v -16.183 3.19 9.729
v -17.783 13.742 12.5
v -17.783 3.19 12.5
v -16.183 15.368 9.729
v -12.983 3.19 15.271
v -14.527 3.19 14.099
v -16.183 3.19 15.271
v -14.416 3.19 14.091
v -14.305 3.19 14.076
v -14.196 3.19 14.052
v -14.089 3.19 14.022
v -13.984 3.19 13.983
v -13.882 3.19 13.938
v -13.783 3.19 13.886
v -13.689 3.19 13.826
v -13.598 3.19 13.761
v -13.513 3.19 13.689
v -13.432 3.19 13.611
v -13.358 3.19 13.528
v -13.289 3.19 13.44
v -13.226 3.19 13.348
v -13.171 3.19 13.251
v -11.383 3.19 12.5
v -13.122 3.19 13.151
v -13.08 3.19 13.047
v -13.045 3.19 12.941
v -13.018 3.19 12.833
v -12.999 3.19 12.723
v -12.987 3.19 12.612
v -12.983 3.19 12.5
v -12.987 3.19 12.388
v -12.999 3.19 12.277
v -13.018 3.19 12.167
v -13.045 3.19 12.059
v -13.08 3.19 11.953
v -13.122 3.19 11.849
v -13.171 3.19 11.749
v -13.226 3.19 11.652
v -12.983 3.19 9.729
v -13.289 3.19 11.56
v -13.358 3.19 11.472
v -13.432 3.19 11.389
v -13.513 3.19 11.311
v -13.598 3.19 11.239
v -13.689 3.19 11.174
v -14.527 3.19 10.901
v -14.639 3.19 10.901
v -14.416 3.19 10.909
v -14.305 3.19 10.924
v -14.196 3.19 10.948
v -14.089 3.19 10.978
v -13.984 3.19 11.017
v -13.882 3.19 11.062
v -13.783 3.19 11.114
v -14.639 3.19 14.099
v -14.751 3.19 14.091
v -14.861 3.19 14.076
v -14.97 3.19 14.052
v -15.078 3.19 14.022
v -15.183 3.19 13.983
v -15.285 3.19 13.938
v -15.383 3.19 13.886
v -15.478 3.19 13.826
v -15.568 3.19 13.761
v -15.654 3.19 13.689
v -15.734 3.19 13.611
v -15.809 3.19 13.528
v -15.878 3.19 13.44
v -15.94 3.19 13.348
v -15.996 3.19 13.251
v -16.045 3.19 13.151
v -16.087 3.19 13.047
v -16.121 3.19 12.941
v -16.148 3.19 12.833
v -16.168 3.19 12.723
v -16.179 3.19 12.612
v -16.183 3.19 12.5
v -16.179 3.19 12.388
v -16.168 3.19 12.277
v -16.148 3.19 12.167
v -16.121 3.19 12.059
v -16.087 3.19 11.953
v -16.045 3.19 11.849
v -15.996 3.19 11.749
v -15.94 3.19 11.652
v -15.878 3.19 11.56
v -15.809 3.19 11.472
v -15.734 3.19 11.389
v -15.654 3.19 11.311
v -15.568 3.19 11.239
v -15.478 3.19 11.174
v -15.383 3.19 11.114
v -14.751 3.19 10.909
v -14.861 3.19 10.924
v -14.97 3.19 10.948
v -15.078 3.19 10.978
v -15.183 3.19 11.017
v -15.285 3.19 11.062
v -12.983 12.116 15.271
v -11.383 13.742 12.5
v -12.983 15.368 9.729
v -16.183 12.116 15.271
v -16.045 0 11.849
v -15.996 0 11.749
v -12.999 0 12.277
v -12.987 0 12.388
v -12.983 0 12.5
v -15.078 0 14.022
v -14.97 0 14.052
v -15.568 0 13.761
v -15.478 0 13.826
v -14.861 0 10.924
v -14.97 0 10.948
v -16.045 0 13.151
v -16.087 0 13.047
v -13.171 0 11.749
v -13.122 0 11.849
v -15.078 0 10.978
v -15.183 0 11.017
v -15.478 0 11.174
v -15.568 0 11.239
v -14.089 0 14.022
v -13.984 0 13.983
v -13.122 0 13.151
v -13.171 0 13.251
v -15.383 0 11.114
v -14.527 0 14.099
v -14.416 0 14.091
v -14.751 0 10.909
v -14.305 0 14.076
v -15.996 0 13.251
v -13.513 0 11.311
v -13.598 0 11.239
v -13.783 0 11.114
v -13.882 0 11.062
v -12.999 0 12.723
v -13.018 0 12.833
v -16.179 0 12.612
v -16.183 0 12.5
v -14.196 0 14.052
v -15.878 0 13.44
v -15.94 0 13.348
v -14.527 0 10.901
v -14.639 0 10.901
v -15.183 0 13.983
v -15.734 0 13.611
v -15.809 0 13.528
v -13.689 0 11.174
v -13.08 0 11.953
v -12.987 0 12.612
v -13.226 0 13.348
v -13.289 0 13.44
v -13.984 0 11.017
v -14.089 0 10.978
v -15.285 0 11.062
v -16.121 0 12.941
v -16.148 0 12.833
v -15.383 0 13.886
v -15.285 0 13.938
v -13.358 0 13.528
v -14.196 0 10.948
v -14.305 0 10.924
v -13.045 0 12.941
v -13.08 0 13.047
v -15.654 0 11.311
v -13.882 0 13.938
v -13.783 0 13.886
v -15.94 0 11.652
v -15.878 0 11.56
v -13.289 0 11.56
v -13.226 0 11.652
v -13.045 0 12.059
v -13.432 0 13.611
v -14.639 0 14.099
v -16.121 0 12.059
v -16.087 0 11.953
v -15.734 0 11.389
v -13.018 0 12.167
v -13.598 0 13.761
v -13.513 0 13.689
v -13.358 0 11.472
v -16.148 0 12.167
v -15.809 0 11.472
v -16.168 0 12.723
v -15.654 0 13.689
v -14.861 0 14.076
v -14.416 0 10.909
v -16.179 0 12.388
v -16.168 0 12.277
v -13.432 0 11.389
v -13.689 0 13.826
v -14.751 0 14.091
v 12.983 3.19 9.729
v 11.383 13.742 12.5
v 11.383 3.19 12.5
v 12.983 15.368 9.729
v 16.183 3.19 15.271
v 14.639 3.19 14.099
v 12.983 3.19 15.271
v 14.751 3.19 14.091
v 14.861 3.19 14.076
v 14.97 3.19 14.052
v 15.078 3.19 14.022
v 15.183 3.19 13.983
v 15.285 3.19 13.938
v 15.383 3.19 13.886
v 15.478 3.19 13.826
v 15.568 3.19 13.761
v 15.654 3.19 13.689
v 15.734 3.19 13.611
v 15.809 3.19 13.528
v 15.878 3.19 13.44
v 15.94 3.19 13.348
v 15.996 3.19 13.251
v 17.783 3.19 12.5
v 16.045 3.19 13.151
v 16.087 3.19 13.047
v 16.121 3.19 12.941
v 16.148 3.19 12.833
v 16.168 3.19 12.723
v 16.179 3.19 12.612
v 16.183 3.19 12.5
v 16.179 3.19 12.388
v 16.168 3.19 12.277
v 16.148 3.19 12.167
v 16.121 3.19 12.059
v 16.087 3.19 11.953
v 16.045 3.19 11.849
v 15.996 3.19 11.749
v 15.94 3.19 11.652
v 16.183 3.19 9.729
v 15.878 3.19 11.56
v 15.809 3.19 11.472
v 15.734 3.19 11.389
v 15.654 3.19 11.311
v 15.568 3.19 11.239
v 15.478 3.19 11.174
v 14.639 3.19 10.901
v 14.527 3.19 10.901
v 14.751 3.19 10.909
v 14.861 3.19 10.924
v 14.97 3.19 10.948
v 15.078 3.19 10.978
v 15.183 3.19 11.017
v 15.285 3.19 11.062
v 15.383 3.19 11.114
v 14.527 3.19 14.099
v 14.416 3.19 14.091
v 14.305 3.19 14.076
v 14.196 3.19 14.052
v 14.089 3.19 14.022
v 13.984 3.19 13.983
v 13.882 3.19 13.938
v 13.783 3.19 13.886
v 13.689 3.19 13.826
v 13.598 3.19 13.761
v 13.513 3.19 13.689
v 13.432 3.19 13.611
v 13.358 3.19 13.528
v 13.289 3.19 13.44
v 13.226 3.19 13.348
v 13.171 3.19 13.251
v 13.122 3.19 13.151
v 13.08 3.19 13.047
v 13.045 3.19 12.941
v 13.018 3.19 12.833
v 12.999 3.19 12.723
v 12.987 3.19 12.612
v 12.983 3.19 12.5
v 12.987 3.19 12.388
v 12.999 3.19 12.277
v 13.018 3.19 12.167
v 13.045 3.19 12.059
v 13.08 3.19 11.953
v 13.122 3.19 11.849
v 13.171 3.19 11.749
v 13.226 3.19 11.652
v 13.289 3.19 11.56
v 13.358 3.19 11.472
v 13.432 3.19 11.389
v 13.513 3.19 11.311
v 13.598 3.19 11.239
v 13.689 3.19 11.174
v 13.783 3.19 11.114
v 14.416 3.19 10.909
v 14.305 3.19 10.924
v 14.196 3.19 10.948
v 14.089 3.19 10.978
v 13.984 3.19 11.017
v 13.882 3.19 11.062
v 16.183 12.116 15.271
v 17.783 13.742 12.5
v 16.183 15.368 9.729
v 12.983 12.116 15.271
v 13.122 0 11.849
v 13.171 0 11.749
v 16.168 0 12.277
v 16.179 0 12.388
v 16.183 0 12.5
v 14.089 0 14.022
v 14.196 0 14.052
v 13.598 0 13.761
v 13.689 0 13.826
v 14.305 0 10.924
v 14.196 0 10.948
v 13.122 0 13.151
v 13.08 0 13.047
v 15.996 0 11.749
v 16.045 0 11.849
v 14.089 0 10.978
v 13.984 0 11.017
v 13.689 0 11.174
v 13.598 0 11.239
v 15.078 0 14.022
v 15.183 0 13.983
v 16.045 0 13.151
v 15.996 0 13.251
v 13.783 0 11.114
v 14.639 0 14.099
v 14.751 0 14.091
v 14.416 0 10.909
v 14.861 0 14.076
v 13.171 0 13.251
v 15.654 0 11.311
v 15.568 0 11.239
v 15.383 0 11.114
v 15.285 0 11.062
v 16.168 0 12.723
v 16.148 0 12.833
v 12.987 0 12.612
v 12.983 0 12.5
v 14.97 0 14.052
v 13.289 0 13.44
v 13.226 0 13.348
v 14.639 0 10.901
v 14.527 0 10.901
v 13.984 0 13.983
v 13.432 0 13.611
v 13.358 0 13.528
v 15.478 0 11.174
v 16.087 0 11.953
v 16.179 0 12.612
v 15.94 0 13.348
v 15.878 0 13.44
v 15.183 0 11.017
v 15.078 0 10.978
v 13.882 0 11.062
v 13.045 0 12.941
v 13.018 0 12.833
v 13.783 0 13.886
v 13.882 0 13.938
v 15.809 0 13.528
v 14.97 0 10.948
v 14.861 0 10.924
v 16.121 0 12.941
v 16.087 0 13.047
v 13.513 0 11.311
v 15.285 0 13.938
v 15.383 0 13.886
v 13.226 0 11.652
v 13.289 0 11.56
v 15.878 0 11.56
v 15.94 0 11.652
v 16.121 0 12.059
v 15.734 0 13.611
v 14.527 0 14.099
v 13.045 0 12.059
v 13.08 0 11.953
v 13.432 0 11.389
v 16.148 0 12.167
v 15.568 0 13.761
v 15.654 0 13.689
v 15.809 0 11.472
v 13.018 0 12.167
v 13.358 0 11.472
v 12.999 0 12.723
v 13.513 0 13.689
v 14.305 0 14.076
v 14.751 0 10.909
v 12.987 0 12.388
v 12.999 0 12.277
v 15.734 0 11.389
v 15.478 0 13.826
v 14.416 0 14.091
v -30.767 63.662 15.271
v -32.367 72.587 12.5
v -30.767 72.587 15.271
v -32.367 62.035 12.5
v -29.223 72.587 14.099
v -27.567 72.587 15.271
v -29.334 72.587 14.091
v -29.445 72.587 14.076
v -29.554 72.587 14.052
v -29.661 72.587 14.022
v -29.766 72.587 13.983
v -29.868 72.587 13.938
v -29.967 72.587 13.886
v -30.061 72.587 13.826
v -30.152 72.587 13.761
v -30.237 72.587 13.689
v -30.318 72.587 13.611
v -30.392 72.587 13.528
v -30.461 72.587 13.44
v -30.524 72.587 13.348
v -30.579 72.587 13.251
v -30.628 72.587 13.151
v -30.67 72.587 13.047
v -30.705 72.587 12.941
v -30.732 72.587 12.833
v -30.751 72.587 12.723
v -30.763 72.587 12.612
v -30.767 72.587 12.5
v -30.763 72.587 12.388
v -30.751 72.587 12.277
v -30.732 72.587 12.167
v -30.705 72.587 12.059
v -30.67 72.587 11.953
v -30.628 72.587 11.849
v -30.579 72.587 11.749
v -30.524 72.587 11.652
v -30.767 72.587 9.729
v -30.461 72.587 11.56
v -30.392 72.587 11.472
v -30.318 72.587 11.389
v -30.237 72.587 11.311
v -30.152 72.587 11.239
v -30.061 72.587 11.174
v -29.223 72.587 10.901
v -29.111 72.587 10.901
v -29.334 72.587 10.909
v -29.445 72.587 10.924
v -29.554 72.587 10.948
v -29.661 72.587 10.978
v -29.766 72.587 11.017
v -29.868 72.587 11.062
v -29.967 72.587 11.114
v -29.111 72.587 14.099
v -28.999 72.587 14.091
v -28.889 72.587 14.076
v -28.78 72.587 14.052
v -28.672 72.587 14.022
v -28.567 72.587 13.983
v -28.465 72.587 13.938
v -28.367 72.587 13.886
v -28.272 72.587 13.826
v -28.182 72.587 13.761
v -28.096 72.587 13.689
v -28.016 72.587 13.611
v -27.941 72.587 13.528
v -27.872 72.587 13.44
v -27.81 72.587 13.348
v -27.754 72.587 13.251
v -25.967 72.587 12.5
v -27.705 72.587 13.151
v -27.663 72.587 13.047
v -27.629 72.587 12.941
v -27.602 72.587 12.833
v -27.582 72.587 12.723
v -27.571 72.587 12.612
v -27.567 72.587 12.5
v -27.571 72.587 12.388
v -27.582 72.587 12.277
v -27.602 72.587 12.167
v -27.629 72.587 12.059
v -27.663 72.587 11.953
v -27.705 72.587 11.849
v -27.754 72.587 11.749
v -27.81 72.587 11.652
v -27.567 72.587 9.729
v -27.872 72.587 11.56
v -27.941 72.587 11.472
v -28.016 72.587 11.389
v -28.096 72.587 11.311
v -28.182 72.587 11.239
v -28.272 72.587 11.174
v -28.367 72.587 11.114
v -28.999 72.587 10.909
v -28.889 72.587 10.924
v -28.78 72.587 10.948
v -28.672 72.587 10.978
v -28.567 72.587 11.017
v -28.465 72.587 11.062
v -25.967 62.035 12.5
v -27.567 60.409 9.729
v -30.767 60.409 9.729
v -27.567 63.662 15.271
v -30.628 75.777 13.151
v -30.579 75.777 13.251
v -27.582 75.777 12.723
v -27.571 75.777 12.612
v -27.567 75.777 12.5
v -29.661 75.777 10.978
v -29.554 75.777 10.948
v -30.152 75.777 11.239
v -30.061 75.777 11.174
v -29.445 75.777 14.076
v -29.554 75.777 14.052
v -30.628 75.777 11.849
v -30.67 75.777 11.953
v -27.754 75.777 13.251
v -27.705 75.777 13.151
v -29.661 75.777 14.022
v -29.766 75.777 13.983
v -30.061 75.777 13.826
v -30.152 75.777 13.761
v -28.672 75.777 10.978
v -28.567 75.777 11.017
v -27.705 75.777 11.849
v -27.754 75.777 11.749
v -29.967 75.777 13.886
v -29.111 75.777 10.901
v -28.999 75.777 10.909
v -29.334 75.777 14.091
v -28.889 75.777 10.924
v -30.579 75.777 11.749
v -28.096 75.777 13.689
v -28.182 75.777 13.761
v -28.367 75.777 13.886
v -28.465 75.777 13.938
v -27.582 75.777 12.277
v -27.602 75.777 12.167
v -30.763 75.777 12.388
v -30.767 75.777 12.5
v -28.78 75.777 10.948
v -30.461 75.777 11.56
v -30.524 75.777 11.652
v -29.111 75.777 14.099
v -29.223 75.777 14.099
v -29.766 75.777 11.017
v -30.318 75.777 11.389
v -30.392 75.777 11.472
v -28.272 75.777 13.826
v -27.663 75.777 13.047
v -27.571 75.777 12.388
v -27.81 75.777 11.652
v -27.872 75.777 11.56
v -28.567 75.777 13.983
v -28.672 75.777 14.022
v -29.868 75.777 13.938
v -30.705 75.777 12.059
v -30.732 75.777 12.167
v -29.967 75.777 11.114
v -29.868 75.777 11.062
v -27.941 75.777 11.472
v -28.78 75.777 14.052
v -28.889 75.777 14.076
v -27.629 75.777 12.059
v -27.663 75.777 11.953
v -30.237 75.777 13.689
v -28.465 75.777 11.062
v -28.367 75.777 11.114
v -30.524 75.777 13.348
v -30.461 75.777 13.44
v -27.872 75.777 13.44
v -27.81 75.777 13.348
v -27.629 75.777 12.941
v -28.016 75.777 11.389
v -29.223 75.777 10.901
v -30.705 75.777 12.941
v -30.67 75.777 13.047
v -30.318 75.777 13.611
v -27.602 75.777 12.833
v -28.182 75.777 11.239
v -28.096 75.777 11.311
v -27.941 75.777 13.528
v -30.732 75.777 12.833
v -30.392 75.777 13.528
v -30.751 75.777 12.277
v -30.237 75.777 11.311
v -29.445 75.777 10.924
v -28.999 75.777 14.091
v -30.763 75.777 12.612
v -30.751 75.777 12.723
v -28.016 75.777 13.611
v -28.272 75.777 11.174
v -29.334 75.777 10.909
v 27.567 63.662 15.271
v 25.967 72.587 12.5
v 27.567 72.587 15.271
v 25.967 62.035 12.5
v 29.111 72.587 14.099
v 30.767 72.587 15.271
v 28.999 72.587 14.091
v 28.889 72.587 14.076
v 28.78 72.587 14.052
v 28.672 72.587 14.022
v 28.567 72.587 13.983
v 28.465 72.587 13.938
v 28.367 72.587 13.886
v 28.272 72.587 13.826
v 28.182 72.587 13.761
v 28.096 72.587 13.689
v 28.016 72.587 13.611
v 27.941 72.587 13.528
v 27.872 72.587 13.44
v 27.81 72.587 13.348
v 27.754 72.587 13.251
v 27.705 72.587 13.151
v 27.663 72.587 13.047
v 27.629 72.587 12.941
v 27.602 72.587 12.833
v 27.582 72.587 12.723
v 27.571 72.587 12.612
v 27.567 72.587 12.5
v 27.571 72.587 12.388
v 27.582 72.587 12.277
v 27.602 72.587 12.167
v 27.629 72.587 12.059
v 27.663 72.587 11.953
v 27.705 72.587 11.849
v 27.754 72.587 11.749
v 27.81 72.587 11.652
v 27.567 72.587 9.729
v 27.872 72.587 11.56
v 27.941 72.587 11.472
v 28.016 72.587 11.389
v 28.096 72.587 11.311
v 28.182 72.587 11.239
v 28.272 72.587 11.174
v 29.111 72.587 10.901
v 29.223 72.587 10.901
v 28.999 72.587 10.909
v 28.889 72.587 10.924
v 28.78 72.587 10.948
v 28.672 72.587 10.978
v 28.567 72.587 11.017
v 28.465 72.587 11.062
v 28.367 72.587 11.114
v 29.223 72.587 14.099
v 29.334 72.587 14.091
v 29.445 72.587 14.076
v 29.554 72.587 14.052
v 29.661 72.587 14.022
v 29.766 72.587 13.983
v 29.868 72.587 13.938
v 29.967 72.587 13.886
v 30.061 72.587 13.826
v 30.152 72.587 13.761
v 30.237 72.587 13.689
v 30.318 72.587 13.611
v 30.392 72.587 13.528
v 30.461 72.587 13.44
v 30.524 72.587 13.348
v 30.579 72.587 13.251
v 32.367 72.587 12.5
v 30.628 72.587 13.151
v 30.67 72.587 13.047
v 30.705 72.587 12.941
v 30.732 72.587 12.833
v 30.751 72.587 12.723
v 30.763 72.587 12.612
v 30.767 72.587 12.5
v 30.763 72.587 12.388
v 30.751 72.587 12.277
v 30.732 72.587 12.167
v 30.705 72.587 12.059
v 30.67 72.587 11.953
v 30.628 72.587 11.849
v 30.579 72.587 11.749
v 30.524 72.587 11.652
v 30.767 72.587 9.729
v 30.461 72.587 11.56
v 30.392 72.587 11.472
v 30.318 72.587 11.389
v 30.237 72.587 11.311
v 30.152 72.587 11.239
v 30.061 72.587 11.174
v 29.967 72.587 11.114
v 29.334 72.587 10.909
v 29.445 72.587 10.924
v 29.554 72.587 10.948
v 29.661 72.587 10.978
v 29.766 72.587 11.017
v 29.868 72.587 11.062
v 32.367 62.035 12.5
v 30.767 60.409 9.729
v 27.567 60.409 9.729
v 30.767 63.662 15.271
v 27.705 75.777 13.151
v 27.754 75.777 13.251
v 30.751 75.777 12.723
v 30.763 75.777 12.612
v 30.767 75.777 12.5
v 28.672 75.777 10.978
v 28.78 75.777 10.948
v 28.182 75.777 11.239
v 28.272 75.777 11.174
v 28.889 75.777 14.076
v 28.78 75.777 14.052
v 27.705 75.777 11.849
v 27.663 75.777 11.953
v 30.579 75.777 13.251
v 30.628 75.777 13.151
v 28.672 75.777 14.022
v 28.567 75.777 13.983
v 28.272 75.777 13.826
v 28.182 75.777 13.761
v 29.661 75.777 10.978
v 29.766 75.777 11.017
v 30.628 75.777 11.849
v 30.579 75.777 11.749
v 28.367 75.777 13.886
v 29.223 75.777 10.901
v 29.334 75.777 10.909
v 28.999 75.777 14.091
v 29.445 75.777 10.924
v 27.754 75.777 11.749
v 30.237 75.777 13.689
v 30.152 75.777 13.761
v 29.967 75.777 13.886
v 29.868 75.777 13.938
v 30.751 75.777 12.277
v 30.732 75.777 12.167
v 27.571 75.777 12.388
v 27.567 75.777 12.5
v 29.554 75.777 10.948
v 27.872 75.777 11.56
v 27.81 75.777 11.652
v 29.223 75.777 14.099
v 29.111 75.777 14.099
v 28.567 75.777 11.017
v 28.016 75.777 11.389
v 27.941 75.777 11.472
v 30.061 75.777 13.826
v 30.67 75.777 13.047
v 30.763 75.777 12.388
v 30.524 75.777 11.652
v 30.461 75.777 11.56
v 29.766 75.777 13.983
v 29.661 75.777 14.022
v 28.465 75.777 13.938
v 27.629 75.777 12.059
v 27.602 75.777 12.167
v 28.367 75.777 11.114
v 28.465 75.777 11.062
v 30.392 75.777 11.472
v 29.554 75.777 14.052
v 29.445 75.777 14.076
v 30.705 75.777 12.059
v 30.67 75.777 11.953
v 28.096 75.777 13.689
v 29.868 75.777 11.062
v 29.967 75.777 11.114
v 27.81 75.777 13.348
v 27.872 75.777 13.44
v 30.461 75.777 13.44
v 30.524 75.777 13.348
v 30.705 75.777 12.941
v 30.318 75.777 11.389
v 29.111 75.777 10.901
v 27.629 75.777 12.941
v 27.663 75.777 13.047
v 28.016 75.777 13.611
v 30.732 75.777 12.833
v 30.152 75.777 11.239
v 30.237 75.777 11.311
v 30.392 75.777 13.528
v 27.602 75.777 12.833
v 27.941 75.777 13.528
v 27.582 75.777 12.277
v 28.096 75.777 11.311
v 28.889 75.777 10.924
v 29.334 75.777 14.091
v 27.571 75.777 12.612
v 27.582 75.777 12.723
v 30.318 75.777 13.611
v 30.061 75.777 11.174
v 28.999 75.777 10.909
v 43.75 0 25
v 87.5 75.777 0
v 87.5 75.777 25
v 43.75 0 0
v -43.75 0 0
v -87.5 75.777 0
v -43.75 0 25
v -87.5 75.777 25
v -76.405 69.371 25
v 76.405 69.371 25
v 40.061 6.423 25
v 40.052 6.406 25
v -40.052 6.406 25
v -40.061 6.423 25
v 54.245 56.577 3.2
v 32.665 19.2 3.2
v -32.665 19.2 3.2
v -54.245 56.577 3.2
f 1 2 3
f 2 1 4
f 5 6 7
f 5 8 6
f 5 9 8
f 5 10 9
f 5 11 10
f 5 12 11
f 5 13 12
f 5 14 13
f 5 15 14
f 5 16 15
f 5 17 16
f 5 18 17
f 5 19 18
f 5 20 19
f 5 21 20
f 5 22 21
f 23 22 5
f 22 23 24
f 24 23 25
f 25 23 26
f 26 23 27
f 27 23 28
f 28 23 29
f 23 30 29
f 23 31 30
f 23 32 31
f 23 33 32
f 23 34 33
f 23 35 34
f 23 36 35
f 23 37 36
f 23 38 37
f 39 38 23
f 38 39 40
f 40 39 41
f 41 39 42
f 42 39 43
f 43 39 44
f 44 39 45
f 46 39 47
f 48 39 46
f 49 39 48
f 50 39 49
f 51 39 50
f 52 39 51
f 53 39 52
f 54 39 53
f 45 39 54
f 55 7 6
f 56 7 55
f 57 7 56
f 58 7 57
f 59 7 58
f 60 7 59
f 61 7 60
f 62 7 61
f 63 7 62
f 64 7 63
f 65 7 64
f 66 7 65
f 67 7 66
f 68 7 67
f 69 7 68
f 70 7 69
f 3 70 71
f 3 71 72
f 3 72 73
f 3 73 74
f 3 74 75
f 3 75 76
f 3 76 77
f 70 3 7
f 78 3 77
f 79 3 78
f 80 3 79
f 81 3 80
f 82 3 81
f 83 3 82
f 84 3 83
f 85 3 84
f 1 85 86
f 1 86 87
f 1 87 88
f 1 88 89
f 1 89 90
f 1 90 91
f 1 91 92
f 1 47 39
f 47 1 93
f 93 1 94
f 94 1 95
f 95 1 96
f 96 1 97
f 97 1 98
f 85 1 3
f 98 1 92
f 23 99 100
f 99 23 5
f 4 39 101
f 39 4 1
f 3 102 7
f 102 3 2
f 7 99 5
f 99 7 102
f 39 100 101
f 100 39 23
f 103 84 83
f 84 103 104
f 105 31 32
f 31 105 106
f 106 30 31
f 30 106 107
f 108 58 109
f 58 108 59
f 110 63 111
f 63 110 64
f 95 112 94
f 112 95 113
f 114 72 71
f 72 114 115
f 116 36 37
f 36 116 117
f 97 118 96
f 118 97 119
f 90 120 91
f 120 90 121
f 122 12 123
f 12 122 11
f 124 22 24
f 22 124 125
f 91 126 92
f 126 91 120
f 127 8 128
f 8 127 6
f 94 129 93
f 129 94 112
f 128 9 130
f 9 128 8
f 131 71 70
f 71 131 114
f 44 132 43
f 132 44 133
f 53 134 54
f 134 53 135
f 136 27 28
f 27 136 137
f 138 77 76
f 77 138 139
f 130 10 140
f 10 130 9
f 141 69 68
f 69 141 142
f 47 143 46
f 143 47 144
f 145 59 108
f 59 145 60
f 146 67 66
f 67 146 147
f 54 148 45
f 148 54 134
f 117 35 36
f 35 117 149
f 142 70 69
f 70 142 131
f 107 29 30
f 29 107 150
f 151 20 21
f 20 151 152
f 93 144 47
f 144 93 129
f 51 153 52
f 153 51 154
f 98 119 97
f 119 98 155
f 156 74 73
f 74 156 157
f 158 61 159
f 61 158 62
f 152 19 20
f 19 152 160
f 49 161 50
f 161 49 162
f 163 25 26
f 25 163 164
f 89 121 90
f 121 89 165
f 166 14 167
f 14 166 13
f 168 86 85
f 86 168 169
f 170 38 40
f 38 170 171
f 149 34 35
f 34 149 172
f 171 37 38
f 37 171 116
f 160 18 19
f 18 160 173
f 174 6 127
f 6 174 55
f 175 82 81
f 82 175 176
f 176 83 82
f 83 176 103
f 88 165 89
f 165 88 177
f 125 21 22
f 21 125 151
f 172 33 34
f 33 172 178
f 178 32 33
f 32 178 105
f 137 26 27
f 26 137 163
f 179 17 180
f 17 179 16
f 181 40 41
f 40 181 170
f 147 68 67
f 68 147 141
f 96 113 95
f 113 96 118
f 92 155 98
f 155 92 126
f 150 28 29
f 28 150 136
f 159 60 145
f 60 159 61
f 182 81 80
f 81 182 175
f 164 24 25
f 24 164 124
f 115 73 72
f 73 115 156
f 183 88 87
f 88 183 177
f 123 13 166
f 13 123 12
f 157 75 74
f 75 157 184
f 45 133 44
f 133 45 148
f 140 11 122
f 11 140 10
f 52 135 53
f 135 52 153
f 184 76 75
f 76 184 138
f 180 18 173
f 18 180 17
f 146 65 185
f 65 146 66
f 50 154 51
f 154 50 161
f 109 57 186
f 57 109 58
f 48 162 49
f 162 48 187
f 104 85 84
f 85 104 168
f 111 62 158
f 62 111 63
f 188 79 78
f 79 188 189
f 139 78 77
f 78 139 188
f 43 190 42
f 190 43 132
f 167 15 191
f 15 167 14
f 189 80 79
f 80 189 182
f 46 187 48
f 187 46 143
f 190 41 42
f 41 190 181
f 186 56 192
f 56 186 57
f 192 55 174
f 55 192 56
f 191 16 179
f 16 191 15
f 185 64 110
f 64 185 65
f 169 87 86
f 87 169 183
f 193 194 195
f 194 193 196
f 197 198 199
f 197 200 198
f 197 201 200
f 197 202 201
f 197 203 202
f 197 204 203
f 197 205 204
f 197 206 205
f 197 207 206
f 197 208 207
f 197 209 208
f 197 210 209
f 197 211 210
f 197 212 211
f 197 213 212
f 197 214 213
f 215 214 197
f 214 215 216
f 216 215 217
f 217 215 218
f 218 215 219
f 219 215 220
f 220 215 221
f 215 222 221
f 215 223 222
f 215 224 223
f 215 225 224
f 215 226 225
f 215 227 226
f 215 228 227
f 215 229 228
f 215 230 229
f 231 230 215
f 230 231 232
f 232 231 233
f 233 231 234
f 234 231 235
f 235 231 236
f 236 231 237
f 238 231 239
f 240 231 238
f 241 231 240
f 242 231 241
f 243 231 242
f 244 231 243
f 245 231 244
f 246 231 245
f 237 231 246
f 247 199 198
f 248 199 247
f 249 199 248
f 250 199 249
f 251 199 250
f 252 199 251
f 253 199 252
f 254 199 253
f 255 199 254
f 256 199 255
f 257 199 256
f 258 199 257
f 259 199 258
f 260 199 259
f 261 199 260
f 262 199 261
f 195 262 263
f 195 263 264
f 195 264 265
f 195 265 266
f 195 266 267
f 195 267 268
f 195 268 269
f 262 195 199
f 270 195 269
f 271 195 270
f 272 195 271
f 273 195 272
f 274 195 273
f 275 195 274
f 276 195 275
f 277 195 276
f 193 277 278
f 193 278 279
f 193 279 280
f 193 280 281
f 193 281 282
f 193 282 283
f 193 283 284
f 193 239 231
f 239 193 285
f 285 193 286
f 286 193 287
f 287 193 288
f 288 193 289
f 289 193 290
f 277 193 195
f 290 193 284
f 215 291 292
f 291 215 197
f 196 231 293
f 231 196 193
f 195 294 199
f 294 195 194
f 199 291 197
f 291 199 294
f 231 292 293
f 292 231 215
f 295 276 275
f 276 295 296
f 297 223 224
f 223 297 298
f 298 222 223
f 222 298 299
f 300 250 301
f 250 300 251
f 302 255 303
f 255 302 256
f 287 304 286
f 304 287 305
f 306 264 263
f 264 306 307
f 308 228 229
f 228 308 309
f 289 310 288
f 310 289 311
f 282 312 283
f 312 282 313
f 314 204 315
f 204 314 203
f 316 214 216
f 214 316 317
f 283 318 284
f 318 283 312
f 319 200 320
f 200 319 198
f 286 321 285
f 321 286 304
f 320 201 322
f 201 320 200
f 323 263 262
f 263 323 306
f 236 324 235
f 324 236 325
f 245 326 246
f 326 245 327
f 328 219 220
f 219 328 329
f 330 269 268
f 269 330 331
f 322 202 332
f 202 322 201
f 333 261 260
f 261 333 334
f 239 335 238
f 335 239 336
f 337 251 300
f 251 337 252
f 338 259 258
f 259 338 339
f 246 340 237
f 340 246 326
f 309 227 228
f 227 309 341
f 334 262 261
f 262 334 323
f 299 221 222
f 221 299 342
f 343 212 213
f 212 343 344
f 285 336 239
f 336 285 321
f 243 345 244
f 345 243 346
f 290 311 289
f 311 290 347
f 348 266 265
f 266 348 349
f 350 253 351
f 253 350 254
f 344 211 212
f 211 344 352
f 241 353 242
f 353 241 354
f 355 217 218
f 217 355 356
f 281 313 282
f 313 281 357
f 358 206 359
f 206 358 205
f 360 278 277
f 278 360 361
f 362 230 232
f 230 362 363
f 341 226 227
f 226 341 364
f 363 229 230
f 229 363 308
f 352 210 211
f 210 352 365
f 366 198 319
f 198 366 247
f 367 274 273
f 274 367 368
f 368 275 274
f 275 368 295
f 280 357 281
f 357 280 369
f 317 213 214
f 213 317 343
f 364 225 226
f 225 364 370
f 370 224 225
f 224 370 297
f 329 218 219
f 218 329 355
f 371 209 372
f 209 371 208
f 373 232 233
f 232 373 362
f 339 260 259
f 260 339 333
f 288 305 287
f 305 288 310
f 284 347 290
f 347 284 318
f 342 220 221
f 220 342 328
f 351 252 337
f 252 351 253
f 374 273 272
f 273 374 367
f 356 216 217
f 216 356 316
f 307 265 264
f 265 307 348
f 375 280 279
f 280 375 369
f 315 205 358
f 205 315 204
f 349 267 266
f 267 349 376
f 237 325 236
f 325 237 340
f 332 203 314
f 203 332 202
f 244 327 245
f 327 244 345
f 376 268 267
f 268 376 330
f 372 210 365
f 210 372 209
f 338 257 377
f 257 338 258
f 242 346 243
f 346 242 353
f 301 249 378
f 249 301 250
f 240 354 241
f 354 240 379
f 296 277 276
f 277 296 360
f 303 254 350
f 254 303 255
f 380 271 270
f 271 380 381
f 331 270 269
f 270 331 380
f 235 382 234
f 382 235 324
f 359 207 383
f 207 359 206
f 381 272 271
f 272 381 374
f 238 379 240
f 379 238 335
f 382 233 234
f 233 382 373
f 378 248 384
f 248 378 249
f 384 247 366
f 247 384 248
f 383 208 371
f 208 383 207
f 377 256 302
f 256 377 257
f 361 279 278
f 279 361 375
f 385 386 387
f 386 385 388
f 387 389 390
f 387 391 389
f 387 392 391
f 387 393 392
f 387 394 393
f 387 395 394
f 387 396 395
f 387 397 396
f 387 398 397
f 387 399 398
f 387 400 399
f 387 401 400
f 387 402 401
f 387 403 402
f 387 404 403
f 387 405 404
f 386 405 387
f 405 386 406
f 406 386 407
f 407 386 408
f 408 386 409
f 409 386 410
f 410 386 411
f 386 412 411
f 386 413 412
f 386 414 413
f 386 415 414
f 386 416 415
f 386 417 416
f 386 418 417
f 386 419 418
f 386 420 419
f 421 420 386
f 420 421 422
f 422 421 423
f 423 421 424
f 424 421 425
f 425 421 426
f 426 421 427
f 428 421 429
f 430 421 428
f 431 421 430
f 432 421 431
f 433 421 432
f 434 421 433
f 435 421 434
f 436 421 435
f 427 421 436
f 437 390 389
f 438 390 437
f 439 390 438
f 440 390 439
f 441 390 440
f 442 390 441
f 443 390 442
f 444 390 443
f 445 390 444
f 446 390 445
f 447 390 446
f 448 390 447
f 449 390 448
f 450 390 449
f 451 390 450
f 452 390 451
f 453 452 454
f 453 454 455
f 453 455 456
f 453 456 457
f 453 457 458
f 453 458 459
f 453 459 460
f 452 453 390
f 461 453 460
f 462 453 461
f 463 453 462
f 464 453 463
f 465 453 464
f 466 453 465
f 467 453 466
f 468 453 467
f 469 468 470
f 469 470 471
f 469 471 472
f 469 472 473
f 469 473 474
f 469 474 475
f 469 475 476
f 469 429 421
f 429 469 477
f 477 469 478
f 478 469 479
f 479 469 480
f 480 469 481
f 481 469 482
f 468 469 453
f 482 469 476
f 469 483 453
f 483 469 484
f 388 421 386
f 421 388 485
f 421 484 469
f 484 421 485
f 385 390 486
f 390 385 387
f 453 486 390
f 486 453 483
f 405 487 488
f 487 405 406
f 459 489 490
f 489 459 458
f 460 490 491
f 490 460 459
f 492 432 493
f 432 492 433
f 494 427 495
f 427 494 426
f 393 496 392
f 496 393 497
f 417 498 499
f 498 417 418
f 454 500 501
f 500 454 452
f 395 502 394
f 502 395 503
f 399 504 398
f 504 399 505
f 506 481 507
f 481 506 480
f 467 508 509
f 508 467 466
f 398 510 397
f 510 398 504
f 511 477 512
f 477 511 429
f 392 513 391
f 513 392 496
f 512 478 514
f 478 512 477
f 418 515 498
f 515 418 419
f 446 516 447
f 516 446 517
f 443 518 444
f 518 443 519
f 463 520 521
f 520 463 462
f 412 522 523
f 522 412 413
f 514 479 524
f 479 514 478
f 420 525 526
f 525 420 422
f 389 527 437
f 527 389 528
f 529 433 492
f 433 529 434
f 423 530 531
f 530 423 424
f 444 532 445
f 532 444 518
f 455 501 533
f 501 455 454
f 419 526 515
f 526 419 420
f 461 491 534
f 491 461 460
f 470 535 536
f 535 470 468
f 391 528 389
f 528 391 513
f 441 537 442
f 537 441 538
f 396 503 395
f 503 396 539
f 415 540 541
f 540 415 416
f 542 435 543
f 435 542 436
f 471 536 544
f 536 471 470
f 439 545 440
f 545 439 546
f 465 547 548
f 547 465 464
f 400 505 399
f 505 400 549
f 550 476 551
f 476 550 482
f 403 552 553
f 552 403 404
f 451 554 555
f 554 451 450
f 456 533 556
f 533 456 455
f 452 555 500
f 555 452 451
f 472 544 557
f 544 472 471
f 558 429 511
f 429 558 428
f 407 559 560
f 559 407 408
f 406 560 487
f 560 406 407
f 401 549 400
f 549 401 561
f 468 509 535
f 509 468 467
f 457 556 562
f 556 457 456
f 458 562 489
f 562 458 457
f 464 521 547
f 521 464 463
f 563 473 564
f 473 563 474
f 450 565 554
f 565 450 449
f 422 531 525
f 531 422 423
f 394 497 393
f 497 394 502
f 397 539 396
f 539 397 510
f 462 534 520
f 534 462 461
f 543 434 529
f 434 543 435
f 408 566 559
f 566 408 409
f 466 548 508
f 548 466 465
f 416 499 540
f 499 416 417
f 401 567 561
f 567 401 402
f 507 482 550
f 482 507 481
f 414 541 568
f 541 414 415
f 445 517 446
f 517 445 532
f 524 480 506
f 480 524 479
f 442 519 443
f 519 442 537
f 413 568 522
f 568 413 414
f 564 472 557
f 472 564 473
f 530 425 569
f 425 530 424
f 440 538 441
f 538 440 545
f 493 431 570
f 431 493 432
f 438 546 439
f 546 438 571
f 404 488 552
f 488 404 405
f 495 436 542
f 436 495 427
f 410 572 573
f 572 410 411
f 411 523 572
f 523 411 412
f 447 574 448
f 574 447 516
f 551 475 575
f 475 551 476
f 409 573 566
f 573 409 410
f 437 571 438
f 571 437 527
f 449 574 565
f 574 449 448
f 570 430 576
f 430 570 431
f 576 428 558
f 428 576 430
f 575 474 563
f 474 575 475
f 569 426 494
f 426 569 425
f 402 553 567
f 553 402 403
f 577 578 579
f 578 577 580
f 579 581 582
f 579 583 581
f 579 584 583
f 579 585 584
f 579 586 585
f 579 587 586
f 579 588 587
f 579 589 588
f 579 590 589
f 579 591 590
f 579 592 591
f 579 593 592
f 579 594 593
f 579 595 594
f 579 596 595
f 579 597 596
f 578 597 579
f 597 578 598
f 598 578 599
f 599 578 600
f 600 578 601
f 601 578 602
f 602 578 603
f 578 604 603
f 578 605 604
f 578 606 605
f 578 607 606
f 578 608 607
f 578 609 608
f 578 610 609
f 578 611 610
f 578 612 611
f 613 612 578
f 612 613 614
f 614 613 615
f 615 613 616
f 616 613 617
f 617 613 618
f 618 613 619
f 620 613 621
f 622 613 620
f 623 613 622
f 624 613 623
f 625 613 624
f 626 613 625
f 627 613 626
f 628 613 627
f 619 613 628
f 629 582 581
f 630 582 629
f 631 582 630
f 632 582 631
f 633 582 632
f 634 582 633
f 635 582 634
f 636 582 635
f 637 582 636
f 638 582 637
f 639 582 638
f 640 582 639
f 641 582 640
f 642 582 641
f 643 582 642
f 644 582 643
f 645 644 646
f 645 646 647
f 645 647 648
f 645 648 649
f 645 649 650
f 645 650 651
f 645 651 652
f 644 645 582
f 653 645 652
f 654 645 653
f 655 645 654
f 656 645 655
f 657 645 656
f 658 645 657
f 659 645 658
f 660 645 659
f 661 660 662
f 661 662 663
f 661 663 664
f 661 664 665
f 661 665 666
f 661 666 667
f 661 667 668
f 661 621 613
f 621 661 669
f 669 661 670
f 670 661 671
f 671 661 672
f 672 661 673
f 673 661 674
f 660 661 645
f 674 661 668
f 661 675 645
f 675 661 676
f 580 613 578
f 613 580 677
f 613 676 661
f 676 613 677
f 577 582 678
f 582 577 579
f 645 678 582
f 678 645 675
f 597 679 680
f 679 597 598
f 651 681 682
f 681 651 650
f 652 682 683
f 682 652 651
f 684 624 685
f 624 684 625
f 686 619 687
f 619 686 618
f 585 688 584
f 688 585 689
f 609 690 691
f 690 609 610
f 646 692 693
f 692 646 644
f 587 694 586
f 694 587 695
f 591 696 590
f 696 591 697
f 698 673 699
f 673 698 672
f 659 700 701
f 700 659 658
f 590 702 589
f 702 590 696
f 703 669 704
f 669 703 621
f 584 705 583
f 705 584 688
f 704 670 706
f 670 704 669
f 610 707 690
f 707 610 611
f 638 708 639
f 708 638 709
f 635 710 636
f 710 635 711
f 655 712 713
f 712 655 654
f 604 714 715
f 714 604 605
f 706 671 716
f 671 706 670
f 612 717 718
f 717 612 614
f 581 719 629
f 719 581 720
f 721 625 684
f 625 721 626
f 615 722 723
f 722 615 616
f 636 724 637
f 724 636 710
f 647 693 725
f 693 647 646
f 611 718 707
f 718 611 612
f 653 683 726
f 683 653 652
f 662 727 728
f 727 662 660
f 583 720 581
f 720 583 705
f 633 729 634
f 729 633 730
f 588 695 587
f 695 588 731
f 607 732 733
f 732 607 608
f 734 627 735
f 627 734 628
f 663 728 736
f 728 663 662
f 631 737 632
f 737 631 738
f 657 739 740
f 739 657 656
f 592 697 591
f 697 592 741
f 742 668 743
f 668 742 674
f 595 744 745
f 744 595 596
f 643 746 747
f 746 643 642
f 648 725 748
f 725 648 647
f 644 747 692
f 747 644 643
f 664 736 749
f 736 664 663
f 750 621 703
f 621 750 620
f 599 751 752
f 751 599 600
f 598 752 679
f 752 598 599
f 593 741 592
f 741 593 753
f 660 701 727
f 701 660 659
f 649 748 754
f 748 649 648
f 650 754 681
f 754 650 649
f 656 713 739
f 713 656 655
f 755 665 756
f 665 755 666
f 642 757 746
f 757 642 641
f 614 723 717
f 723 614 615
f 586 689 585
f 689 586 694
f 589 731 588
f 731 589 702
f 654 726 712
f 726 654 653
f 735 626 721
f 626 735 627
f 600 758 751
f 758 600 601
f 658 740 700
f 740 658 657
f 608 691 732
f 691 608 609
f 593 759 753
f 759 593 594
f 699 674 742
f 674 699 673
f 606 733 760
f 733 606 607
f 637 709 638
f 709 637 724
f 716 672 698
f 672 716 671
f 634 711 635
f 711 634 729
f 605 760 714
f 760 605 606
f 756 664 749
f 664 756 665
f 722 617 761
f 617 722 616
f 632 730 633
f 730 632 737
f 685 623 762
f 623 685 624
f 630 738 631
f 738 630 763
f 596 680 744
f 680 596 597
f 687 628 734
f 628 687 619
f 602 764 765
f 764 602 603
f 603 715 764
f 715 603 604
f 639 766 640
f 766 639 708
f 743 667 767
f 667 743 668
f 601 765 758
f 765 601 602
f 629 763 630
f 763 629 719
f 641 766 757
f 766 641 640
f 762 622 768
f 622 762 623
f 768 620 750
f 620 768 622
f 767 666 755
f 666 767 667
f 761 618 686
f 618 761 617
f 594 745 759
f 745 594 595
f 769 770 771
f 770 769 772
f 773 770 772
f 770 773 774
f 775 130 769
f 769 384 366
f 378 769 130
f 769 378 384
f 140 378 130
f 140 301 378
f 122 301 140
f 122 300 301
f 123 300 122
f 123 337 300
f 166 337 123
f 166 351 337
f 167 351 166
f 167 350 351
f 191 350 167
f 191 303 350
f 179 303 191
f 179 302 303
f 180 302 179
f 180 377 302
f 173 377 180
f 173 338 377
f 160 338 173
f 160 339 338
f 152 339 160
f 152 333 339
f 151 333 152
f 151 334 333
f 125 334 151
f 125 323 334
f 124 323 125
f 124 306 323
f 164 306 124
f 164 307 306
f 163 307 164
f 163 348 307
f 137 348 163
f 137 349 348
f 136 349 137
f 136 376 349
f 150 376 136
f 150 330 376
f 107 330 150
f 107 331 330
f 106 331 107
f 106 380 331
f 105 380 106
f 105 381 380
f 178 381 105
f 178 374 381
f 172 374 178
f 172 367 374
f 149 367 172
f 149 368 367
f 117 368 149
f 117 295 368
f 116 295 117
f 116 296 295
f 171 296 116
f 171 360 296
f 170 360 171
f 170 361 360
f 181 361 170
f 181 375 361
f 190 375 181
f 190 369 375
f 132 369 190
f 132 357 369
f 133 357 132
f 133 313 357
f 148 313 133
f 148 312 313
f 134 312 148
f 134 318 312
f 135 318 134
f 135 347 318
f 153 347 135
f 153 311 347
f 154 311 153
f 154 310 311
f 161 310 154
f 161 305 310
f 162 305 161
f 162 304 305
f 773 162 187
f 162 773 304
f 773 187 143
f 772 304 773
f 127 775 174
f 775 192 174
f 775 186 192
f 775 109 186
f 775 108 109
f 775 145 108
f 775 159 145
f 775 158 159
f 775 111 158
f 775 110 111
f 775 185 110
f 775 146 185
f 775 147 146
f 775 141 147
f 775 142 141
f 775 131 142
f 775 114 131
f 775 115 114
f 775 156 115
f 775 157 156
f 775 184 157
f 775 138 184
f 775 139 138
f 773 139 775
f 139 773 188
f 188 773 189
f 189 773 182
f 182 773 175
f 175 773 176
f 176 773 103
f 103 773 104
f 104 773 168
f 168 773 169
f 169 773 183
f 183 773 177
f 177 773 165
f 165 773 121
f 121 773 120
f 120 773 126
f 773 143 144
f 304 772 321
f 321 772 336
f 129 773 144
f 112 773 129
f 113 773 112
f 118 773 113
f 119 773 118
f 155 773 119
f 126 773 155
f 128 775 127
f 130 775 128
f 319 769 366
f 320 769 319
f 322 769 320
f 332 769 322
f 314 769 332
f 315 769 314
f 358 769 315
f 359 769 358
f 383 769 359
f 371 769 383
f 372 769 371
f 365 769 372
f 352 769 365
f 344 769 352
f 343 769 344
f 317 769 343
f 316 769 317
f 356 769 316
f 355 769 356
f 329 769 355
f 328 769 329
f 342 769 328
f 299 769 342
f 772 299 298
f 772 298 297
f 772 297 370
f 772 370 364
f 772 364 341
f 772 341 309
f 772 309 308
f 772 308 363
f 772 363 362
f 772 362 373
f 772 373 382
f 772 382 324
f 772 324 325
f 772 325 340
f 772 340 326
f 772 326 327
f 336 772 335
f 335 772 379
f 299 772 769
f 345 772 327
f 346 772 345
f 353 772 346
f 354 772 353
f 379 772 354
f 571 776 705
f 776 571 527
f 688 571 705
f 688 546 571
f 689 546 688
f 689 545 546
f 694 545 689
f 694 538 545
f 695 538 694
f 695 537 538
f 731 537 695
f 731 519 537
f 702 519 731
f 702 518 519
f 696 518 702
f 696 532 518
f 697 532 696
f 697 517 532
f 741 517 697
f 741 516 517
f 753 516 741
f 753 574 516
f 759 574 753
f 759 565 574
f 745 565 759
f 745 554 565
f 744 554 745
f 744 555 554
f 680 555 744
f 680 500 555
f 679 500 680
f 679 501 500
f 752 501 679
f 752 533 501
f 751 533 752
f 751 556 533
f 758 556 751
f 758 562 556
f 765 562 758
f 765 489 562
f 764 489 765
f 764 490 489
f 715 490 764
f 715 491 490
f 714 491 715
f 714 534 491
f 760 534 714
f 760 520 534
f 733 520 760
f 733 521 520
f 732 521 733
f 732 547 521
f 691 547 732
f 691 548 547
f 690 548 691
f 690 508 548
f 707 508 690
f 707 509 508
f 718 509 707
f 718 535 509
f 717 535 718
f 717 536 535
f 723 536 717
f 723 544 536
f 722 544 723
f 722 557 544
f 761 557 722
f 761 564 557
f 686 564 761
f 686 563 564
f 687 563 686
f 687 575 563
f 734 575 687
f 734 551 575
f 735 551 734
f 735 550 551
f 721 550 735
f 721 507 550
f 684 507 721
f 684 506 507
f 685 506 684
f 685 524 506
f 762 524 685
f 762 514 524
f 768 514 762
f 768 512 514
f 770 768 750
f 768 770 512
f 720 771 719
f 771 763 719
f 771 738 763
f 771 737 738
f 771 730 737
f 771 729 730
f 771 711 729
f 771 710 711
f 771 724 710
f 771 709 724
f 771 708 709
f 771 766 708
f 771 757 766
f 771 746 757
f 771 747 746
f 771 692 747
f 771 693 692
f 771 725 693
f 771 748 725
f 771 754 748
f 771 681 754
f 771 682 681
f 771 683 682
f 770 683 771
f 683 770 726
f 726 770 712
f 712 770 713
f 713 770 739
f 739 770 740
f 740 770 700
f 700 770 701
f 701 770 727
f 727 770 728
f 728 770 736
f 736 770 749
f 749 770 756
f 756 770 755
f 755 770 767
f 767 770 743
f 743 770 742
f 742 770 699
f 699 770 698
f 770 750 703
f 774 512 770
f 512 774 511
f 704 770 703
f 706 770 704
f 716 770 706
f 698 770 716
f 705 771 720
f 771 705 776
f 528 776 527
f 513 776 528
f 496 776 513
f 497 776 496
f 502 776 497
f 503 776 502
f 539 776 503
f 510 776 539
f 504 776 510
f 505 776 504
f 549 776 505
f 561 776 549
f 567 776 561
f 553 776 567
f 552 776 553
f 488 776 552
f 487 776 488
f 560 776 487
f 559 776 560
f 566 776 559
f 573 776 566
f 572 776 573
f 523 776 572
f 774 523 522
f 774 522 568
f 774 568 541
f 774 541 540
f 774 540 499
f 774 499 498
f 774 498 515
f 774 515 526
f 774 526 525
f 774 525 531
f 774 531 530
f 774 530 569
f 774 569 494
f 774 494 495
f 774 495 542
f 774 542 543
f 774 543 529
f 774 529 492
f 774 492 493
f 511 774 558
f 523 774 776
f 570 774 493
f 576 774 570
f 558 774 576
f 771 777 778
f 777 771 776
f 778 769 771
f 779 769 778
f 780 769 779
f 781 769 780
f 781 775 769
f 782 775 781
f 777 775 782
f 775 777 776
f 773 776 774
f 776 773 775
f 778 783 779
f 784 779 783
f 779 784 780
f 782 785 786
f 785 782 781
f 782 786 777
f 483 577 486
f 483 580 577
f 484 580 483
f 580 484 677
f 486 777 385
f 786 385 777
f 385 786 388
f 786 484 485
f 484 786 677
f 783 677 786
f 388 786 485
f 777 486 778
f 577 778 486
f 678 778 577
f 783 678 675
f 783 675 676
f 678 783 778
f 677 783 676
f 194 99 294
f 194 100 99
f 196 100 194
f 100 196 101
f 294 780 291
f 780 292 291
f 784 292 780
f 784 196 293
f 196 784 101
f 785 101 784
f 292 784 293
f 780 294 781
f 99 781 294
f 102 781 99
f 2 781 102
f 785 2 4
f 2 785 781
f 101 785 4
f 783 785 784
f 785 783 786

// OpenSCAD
// file: ../../modules/hexagon.scad
module hexagon(r = 1) {
  polygon([
    [-1 * r, 0],
    [-.5 * r, r * sqrt(3) / 2],
    [.5 * r, r * sqrt(3) / 2],
    [1 * r, 0],
    [.5 * r, r * sqrt(3) / -2],
    [-.5 * r, r * sqrt(3) / -2],
  ]);
}
// file: _common.scad
$fa=4; // default minimum facet angle is now 0.5
$fs=0.05; // default minimum facet size is now 0.05 mm

include <../../modules/hexagon.scad>

height = 25;
totalWidth = 350;
wallThickness = 6.4;
baseThickness = 3.2;

// M3 screw
screwRad = 1.6;
screwHeadRad = 3;
nutRad = 3.2;
// main file
include <_common.scad>

edgeLength = totalWidth / 4;
outerEdgeLength = edgeLength * 2;
ri = sqrt(3) / 2 * outerEdgeLength;
offsetDistance = sqrt(pow(wallThickness, 2) / 2);

difference() {
  linear_extrude(height) polygon(points = [
    [edgeLength / -2, 0],
    [edgeLength / 2, 0],
    [edgeLength, ri / 2],
    [-edgeLength, ri / 2]
  ]);

  hull() {
    translate([0, 0, baseThickness]) linear_extrude(.01) offset(r = -wallThickness * 3) polygon(points = [
      [edgeLength / -2, 0],
      [edgeLength / 2, 0],
      [edgeLength, ri / 2],
      [-edgeLength, ri / 2]
    ]);

    translate([0, 0, height + .01]) linear_extrude(.01) offset(r = -wallThickness) polygon(points = [
      [edgeLength / -2, 0],
      [edgeLength / 2, 0],
      [edgeLength, ri / 2],
      [-edgeLength, ri / 2]
    ]);
  }

  for(i=[-1, 1]) {
    translate([(edgeLength / 6) * i, -20 + wallThickness / 2, height / 2]) rotate([-90, 0, 0]) {
      translate([0, 0, 19.99]) linear_extrude(20) hexagon(r = nutRad);
      cylinder(h = 20, r = screwRad);
    }
  }

  for(i=[-1, 1]) {
    translate([(edgeLength / 3) * i, (ri / 2) + 20 - wallThickness / 2, height / 2]) rotate([90, 0, 0]) {
      translate([0, 0, 19.99]) linear_extrude(20) hexagon(r = nutRad);
      cylinder(h = 20, r = screwRad);
    }
  }
}
